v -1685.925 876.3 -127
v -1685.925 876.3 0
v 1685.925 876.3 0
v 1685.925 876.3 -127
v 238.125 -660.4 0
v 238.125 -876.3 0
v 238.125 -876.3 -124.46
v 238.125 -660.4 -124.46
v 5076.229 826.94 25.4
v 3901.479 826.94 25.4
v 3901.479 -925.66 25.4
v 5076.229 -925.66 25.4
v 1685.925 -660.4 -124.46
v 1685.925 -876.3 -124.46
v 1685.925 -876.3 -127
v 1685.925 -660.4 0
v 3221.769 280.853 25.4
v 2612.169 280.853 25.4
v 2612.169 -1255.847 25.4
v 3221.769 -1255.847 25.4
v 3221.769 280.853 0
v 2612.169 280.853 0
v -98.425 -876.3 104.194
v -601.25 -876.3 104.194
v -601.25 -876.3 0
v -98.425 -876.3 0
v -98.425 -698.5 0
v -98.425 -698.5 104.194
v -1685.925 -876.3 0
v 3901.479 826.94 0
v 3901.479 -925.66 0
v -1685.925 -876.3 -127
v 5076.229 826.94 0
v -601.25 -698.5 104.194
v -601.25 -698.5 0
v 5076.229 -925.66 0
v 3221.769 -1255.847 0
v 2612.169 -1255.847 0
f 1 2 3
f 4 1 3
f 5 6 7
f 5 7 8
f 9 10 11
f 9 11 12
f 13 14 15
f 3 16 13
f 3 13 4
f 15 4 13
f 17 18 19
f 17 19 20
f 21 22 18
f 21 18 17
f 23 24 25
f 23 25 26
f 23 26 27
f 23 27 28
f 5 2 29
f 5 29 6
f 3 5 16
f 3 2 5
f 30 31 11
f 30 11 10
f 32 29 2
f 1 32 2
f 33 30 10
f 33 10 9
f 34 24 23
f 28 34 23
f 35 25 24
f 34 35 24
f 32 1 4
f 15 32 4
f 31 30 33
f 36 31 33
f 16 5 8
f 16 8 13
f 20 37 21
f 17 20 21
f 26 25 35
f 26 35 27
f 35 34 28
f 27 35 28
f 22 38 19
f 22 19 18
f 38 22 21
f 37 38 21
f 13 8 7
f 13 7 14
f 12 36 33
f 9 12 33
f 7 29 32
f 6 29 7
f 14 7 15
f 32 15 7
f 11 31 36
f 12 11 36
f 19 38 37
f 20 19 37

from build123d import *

# Parameters (mm, degrees)
F0_W     = 3371.85
F0_H     = 1752.6
F1_DEPTH = 127
F2_W     = 1447.8
F2_H     = 215.9
F3_DEPTH = 124.46
F4_W     = 502.824642
F4_H     = 104.193904
F5_DEPTH = 177.8
F6_W     = 609.6
F6_H     = 1536.7
F7_DEPTH = 25.4
F8_W     = 1174.75
F8_H     = 1752.6
F9_DEPTH = 25.4


with BuildPart() as f1:
    # F0 (on Top) → F1 (new body)
    with BuildSketch(Plane.XY):
        Rectangle(F0_W, F0_H)
    extrude(amount=-F1_DEPTH)

    # F2 (on face) → F3 (cut)
    with BuildSketch(Plane.XY):
        with Locations((962.025, -768.35)):
            Rectangle(F2_W, F2_H)
    extrude(amount=-F3_DEPTH, mode=Mode.SUBTRACT)


with BuildPart() as f5:
    # F4 (on face) → F5 (new body)
    with BuildSketch(Plane.XZ.offset(876.3)):
        with Locations((-349.837321, 52.096952)):
            Rectangle(F4_W, F4_H)
    extrude(amount=-F5_DEPTH)


with BuildPart() as f7:
    # F6 (on face) → F7 (new body)
    with BuildSketch(Plane.XY):
        with Locations((2916.969489, -487.496719)):
            Rectangle(F6_W, F6_H)
    extrude(amount=F7_DEPTH)


with BuildPart() as f9:
    # F8 (on face) → F9 (new body)
    with BuildSketch(Plane.XY):
        with Locations((4488.853682, -49.359781)):
            Rectangle(F8_W, F8_H)
    extrude(amount=F9_DEPTH)


solid = Compound([f1.part, f5.part, f7.part, f9.part])
